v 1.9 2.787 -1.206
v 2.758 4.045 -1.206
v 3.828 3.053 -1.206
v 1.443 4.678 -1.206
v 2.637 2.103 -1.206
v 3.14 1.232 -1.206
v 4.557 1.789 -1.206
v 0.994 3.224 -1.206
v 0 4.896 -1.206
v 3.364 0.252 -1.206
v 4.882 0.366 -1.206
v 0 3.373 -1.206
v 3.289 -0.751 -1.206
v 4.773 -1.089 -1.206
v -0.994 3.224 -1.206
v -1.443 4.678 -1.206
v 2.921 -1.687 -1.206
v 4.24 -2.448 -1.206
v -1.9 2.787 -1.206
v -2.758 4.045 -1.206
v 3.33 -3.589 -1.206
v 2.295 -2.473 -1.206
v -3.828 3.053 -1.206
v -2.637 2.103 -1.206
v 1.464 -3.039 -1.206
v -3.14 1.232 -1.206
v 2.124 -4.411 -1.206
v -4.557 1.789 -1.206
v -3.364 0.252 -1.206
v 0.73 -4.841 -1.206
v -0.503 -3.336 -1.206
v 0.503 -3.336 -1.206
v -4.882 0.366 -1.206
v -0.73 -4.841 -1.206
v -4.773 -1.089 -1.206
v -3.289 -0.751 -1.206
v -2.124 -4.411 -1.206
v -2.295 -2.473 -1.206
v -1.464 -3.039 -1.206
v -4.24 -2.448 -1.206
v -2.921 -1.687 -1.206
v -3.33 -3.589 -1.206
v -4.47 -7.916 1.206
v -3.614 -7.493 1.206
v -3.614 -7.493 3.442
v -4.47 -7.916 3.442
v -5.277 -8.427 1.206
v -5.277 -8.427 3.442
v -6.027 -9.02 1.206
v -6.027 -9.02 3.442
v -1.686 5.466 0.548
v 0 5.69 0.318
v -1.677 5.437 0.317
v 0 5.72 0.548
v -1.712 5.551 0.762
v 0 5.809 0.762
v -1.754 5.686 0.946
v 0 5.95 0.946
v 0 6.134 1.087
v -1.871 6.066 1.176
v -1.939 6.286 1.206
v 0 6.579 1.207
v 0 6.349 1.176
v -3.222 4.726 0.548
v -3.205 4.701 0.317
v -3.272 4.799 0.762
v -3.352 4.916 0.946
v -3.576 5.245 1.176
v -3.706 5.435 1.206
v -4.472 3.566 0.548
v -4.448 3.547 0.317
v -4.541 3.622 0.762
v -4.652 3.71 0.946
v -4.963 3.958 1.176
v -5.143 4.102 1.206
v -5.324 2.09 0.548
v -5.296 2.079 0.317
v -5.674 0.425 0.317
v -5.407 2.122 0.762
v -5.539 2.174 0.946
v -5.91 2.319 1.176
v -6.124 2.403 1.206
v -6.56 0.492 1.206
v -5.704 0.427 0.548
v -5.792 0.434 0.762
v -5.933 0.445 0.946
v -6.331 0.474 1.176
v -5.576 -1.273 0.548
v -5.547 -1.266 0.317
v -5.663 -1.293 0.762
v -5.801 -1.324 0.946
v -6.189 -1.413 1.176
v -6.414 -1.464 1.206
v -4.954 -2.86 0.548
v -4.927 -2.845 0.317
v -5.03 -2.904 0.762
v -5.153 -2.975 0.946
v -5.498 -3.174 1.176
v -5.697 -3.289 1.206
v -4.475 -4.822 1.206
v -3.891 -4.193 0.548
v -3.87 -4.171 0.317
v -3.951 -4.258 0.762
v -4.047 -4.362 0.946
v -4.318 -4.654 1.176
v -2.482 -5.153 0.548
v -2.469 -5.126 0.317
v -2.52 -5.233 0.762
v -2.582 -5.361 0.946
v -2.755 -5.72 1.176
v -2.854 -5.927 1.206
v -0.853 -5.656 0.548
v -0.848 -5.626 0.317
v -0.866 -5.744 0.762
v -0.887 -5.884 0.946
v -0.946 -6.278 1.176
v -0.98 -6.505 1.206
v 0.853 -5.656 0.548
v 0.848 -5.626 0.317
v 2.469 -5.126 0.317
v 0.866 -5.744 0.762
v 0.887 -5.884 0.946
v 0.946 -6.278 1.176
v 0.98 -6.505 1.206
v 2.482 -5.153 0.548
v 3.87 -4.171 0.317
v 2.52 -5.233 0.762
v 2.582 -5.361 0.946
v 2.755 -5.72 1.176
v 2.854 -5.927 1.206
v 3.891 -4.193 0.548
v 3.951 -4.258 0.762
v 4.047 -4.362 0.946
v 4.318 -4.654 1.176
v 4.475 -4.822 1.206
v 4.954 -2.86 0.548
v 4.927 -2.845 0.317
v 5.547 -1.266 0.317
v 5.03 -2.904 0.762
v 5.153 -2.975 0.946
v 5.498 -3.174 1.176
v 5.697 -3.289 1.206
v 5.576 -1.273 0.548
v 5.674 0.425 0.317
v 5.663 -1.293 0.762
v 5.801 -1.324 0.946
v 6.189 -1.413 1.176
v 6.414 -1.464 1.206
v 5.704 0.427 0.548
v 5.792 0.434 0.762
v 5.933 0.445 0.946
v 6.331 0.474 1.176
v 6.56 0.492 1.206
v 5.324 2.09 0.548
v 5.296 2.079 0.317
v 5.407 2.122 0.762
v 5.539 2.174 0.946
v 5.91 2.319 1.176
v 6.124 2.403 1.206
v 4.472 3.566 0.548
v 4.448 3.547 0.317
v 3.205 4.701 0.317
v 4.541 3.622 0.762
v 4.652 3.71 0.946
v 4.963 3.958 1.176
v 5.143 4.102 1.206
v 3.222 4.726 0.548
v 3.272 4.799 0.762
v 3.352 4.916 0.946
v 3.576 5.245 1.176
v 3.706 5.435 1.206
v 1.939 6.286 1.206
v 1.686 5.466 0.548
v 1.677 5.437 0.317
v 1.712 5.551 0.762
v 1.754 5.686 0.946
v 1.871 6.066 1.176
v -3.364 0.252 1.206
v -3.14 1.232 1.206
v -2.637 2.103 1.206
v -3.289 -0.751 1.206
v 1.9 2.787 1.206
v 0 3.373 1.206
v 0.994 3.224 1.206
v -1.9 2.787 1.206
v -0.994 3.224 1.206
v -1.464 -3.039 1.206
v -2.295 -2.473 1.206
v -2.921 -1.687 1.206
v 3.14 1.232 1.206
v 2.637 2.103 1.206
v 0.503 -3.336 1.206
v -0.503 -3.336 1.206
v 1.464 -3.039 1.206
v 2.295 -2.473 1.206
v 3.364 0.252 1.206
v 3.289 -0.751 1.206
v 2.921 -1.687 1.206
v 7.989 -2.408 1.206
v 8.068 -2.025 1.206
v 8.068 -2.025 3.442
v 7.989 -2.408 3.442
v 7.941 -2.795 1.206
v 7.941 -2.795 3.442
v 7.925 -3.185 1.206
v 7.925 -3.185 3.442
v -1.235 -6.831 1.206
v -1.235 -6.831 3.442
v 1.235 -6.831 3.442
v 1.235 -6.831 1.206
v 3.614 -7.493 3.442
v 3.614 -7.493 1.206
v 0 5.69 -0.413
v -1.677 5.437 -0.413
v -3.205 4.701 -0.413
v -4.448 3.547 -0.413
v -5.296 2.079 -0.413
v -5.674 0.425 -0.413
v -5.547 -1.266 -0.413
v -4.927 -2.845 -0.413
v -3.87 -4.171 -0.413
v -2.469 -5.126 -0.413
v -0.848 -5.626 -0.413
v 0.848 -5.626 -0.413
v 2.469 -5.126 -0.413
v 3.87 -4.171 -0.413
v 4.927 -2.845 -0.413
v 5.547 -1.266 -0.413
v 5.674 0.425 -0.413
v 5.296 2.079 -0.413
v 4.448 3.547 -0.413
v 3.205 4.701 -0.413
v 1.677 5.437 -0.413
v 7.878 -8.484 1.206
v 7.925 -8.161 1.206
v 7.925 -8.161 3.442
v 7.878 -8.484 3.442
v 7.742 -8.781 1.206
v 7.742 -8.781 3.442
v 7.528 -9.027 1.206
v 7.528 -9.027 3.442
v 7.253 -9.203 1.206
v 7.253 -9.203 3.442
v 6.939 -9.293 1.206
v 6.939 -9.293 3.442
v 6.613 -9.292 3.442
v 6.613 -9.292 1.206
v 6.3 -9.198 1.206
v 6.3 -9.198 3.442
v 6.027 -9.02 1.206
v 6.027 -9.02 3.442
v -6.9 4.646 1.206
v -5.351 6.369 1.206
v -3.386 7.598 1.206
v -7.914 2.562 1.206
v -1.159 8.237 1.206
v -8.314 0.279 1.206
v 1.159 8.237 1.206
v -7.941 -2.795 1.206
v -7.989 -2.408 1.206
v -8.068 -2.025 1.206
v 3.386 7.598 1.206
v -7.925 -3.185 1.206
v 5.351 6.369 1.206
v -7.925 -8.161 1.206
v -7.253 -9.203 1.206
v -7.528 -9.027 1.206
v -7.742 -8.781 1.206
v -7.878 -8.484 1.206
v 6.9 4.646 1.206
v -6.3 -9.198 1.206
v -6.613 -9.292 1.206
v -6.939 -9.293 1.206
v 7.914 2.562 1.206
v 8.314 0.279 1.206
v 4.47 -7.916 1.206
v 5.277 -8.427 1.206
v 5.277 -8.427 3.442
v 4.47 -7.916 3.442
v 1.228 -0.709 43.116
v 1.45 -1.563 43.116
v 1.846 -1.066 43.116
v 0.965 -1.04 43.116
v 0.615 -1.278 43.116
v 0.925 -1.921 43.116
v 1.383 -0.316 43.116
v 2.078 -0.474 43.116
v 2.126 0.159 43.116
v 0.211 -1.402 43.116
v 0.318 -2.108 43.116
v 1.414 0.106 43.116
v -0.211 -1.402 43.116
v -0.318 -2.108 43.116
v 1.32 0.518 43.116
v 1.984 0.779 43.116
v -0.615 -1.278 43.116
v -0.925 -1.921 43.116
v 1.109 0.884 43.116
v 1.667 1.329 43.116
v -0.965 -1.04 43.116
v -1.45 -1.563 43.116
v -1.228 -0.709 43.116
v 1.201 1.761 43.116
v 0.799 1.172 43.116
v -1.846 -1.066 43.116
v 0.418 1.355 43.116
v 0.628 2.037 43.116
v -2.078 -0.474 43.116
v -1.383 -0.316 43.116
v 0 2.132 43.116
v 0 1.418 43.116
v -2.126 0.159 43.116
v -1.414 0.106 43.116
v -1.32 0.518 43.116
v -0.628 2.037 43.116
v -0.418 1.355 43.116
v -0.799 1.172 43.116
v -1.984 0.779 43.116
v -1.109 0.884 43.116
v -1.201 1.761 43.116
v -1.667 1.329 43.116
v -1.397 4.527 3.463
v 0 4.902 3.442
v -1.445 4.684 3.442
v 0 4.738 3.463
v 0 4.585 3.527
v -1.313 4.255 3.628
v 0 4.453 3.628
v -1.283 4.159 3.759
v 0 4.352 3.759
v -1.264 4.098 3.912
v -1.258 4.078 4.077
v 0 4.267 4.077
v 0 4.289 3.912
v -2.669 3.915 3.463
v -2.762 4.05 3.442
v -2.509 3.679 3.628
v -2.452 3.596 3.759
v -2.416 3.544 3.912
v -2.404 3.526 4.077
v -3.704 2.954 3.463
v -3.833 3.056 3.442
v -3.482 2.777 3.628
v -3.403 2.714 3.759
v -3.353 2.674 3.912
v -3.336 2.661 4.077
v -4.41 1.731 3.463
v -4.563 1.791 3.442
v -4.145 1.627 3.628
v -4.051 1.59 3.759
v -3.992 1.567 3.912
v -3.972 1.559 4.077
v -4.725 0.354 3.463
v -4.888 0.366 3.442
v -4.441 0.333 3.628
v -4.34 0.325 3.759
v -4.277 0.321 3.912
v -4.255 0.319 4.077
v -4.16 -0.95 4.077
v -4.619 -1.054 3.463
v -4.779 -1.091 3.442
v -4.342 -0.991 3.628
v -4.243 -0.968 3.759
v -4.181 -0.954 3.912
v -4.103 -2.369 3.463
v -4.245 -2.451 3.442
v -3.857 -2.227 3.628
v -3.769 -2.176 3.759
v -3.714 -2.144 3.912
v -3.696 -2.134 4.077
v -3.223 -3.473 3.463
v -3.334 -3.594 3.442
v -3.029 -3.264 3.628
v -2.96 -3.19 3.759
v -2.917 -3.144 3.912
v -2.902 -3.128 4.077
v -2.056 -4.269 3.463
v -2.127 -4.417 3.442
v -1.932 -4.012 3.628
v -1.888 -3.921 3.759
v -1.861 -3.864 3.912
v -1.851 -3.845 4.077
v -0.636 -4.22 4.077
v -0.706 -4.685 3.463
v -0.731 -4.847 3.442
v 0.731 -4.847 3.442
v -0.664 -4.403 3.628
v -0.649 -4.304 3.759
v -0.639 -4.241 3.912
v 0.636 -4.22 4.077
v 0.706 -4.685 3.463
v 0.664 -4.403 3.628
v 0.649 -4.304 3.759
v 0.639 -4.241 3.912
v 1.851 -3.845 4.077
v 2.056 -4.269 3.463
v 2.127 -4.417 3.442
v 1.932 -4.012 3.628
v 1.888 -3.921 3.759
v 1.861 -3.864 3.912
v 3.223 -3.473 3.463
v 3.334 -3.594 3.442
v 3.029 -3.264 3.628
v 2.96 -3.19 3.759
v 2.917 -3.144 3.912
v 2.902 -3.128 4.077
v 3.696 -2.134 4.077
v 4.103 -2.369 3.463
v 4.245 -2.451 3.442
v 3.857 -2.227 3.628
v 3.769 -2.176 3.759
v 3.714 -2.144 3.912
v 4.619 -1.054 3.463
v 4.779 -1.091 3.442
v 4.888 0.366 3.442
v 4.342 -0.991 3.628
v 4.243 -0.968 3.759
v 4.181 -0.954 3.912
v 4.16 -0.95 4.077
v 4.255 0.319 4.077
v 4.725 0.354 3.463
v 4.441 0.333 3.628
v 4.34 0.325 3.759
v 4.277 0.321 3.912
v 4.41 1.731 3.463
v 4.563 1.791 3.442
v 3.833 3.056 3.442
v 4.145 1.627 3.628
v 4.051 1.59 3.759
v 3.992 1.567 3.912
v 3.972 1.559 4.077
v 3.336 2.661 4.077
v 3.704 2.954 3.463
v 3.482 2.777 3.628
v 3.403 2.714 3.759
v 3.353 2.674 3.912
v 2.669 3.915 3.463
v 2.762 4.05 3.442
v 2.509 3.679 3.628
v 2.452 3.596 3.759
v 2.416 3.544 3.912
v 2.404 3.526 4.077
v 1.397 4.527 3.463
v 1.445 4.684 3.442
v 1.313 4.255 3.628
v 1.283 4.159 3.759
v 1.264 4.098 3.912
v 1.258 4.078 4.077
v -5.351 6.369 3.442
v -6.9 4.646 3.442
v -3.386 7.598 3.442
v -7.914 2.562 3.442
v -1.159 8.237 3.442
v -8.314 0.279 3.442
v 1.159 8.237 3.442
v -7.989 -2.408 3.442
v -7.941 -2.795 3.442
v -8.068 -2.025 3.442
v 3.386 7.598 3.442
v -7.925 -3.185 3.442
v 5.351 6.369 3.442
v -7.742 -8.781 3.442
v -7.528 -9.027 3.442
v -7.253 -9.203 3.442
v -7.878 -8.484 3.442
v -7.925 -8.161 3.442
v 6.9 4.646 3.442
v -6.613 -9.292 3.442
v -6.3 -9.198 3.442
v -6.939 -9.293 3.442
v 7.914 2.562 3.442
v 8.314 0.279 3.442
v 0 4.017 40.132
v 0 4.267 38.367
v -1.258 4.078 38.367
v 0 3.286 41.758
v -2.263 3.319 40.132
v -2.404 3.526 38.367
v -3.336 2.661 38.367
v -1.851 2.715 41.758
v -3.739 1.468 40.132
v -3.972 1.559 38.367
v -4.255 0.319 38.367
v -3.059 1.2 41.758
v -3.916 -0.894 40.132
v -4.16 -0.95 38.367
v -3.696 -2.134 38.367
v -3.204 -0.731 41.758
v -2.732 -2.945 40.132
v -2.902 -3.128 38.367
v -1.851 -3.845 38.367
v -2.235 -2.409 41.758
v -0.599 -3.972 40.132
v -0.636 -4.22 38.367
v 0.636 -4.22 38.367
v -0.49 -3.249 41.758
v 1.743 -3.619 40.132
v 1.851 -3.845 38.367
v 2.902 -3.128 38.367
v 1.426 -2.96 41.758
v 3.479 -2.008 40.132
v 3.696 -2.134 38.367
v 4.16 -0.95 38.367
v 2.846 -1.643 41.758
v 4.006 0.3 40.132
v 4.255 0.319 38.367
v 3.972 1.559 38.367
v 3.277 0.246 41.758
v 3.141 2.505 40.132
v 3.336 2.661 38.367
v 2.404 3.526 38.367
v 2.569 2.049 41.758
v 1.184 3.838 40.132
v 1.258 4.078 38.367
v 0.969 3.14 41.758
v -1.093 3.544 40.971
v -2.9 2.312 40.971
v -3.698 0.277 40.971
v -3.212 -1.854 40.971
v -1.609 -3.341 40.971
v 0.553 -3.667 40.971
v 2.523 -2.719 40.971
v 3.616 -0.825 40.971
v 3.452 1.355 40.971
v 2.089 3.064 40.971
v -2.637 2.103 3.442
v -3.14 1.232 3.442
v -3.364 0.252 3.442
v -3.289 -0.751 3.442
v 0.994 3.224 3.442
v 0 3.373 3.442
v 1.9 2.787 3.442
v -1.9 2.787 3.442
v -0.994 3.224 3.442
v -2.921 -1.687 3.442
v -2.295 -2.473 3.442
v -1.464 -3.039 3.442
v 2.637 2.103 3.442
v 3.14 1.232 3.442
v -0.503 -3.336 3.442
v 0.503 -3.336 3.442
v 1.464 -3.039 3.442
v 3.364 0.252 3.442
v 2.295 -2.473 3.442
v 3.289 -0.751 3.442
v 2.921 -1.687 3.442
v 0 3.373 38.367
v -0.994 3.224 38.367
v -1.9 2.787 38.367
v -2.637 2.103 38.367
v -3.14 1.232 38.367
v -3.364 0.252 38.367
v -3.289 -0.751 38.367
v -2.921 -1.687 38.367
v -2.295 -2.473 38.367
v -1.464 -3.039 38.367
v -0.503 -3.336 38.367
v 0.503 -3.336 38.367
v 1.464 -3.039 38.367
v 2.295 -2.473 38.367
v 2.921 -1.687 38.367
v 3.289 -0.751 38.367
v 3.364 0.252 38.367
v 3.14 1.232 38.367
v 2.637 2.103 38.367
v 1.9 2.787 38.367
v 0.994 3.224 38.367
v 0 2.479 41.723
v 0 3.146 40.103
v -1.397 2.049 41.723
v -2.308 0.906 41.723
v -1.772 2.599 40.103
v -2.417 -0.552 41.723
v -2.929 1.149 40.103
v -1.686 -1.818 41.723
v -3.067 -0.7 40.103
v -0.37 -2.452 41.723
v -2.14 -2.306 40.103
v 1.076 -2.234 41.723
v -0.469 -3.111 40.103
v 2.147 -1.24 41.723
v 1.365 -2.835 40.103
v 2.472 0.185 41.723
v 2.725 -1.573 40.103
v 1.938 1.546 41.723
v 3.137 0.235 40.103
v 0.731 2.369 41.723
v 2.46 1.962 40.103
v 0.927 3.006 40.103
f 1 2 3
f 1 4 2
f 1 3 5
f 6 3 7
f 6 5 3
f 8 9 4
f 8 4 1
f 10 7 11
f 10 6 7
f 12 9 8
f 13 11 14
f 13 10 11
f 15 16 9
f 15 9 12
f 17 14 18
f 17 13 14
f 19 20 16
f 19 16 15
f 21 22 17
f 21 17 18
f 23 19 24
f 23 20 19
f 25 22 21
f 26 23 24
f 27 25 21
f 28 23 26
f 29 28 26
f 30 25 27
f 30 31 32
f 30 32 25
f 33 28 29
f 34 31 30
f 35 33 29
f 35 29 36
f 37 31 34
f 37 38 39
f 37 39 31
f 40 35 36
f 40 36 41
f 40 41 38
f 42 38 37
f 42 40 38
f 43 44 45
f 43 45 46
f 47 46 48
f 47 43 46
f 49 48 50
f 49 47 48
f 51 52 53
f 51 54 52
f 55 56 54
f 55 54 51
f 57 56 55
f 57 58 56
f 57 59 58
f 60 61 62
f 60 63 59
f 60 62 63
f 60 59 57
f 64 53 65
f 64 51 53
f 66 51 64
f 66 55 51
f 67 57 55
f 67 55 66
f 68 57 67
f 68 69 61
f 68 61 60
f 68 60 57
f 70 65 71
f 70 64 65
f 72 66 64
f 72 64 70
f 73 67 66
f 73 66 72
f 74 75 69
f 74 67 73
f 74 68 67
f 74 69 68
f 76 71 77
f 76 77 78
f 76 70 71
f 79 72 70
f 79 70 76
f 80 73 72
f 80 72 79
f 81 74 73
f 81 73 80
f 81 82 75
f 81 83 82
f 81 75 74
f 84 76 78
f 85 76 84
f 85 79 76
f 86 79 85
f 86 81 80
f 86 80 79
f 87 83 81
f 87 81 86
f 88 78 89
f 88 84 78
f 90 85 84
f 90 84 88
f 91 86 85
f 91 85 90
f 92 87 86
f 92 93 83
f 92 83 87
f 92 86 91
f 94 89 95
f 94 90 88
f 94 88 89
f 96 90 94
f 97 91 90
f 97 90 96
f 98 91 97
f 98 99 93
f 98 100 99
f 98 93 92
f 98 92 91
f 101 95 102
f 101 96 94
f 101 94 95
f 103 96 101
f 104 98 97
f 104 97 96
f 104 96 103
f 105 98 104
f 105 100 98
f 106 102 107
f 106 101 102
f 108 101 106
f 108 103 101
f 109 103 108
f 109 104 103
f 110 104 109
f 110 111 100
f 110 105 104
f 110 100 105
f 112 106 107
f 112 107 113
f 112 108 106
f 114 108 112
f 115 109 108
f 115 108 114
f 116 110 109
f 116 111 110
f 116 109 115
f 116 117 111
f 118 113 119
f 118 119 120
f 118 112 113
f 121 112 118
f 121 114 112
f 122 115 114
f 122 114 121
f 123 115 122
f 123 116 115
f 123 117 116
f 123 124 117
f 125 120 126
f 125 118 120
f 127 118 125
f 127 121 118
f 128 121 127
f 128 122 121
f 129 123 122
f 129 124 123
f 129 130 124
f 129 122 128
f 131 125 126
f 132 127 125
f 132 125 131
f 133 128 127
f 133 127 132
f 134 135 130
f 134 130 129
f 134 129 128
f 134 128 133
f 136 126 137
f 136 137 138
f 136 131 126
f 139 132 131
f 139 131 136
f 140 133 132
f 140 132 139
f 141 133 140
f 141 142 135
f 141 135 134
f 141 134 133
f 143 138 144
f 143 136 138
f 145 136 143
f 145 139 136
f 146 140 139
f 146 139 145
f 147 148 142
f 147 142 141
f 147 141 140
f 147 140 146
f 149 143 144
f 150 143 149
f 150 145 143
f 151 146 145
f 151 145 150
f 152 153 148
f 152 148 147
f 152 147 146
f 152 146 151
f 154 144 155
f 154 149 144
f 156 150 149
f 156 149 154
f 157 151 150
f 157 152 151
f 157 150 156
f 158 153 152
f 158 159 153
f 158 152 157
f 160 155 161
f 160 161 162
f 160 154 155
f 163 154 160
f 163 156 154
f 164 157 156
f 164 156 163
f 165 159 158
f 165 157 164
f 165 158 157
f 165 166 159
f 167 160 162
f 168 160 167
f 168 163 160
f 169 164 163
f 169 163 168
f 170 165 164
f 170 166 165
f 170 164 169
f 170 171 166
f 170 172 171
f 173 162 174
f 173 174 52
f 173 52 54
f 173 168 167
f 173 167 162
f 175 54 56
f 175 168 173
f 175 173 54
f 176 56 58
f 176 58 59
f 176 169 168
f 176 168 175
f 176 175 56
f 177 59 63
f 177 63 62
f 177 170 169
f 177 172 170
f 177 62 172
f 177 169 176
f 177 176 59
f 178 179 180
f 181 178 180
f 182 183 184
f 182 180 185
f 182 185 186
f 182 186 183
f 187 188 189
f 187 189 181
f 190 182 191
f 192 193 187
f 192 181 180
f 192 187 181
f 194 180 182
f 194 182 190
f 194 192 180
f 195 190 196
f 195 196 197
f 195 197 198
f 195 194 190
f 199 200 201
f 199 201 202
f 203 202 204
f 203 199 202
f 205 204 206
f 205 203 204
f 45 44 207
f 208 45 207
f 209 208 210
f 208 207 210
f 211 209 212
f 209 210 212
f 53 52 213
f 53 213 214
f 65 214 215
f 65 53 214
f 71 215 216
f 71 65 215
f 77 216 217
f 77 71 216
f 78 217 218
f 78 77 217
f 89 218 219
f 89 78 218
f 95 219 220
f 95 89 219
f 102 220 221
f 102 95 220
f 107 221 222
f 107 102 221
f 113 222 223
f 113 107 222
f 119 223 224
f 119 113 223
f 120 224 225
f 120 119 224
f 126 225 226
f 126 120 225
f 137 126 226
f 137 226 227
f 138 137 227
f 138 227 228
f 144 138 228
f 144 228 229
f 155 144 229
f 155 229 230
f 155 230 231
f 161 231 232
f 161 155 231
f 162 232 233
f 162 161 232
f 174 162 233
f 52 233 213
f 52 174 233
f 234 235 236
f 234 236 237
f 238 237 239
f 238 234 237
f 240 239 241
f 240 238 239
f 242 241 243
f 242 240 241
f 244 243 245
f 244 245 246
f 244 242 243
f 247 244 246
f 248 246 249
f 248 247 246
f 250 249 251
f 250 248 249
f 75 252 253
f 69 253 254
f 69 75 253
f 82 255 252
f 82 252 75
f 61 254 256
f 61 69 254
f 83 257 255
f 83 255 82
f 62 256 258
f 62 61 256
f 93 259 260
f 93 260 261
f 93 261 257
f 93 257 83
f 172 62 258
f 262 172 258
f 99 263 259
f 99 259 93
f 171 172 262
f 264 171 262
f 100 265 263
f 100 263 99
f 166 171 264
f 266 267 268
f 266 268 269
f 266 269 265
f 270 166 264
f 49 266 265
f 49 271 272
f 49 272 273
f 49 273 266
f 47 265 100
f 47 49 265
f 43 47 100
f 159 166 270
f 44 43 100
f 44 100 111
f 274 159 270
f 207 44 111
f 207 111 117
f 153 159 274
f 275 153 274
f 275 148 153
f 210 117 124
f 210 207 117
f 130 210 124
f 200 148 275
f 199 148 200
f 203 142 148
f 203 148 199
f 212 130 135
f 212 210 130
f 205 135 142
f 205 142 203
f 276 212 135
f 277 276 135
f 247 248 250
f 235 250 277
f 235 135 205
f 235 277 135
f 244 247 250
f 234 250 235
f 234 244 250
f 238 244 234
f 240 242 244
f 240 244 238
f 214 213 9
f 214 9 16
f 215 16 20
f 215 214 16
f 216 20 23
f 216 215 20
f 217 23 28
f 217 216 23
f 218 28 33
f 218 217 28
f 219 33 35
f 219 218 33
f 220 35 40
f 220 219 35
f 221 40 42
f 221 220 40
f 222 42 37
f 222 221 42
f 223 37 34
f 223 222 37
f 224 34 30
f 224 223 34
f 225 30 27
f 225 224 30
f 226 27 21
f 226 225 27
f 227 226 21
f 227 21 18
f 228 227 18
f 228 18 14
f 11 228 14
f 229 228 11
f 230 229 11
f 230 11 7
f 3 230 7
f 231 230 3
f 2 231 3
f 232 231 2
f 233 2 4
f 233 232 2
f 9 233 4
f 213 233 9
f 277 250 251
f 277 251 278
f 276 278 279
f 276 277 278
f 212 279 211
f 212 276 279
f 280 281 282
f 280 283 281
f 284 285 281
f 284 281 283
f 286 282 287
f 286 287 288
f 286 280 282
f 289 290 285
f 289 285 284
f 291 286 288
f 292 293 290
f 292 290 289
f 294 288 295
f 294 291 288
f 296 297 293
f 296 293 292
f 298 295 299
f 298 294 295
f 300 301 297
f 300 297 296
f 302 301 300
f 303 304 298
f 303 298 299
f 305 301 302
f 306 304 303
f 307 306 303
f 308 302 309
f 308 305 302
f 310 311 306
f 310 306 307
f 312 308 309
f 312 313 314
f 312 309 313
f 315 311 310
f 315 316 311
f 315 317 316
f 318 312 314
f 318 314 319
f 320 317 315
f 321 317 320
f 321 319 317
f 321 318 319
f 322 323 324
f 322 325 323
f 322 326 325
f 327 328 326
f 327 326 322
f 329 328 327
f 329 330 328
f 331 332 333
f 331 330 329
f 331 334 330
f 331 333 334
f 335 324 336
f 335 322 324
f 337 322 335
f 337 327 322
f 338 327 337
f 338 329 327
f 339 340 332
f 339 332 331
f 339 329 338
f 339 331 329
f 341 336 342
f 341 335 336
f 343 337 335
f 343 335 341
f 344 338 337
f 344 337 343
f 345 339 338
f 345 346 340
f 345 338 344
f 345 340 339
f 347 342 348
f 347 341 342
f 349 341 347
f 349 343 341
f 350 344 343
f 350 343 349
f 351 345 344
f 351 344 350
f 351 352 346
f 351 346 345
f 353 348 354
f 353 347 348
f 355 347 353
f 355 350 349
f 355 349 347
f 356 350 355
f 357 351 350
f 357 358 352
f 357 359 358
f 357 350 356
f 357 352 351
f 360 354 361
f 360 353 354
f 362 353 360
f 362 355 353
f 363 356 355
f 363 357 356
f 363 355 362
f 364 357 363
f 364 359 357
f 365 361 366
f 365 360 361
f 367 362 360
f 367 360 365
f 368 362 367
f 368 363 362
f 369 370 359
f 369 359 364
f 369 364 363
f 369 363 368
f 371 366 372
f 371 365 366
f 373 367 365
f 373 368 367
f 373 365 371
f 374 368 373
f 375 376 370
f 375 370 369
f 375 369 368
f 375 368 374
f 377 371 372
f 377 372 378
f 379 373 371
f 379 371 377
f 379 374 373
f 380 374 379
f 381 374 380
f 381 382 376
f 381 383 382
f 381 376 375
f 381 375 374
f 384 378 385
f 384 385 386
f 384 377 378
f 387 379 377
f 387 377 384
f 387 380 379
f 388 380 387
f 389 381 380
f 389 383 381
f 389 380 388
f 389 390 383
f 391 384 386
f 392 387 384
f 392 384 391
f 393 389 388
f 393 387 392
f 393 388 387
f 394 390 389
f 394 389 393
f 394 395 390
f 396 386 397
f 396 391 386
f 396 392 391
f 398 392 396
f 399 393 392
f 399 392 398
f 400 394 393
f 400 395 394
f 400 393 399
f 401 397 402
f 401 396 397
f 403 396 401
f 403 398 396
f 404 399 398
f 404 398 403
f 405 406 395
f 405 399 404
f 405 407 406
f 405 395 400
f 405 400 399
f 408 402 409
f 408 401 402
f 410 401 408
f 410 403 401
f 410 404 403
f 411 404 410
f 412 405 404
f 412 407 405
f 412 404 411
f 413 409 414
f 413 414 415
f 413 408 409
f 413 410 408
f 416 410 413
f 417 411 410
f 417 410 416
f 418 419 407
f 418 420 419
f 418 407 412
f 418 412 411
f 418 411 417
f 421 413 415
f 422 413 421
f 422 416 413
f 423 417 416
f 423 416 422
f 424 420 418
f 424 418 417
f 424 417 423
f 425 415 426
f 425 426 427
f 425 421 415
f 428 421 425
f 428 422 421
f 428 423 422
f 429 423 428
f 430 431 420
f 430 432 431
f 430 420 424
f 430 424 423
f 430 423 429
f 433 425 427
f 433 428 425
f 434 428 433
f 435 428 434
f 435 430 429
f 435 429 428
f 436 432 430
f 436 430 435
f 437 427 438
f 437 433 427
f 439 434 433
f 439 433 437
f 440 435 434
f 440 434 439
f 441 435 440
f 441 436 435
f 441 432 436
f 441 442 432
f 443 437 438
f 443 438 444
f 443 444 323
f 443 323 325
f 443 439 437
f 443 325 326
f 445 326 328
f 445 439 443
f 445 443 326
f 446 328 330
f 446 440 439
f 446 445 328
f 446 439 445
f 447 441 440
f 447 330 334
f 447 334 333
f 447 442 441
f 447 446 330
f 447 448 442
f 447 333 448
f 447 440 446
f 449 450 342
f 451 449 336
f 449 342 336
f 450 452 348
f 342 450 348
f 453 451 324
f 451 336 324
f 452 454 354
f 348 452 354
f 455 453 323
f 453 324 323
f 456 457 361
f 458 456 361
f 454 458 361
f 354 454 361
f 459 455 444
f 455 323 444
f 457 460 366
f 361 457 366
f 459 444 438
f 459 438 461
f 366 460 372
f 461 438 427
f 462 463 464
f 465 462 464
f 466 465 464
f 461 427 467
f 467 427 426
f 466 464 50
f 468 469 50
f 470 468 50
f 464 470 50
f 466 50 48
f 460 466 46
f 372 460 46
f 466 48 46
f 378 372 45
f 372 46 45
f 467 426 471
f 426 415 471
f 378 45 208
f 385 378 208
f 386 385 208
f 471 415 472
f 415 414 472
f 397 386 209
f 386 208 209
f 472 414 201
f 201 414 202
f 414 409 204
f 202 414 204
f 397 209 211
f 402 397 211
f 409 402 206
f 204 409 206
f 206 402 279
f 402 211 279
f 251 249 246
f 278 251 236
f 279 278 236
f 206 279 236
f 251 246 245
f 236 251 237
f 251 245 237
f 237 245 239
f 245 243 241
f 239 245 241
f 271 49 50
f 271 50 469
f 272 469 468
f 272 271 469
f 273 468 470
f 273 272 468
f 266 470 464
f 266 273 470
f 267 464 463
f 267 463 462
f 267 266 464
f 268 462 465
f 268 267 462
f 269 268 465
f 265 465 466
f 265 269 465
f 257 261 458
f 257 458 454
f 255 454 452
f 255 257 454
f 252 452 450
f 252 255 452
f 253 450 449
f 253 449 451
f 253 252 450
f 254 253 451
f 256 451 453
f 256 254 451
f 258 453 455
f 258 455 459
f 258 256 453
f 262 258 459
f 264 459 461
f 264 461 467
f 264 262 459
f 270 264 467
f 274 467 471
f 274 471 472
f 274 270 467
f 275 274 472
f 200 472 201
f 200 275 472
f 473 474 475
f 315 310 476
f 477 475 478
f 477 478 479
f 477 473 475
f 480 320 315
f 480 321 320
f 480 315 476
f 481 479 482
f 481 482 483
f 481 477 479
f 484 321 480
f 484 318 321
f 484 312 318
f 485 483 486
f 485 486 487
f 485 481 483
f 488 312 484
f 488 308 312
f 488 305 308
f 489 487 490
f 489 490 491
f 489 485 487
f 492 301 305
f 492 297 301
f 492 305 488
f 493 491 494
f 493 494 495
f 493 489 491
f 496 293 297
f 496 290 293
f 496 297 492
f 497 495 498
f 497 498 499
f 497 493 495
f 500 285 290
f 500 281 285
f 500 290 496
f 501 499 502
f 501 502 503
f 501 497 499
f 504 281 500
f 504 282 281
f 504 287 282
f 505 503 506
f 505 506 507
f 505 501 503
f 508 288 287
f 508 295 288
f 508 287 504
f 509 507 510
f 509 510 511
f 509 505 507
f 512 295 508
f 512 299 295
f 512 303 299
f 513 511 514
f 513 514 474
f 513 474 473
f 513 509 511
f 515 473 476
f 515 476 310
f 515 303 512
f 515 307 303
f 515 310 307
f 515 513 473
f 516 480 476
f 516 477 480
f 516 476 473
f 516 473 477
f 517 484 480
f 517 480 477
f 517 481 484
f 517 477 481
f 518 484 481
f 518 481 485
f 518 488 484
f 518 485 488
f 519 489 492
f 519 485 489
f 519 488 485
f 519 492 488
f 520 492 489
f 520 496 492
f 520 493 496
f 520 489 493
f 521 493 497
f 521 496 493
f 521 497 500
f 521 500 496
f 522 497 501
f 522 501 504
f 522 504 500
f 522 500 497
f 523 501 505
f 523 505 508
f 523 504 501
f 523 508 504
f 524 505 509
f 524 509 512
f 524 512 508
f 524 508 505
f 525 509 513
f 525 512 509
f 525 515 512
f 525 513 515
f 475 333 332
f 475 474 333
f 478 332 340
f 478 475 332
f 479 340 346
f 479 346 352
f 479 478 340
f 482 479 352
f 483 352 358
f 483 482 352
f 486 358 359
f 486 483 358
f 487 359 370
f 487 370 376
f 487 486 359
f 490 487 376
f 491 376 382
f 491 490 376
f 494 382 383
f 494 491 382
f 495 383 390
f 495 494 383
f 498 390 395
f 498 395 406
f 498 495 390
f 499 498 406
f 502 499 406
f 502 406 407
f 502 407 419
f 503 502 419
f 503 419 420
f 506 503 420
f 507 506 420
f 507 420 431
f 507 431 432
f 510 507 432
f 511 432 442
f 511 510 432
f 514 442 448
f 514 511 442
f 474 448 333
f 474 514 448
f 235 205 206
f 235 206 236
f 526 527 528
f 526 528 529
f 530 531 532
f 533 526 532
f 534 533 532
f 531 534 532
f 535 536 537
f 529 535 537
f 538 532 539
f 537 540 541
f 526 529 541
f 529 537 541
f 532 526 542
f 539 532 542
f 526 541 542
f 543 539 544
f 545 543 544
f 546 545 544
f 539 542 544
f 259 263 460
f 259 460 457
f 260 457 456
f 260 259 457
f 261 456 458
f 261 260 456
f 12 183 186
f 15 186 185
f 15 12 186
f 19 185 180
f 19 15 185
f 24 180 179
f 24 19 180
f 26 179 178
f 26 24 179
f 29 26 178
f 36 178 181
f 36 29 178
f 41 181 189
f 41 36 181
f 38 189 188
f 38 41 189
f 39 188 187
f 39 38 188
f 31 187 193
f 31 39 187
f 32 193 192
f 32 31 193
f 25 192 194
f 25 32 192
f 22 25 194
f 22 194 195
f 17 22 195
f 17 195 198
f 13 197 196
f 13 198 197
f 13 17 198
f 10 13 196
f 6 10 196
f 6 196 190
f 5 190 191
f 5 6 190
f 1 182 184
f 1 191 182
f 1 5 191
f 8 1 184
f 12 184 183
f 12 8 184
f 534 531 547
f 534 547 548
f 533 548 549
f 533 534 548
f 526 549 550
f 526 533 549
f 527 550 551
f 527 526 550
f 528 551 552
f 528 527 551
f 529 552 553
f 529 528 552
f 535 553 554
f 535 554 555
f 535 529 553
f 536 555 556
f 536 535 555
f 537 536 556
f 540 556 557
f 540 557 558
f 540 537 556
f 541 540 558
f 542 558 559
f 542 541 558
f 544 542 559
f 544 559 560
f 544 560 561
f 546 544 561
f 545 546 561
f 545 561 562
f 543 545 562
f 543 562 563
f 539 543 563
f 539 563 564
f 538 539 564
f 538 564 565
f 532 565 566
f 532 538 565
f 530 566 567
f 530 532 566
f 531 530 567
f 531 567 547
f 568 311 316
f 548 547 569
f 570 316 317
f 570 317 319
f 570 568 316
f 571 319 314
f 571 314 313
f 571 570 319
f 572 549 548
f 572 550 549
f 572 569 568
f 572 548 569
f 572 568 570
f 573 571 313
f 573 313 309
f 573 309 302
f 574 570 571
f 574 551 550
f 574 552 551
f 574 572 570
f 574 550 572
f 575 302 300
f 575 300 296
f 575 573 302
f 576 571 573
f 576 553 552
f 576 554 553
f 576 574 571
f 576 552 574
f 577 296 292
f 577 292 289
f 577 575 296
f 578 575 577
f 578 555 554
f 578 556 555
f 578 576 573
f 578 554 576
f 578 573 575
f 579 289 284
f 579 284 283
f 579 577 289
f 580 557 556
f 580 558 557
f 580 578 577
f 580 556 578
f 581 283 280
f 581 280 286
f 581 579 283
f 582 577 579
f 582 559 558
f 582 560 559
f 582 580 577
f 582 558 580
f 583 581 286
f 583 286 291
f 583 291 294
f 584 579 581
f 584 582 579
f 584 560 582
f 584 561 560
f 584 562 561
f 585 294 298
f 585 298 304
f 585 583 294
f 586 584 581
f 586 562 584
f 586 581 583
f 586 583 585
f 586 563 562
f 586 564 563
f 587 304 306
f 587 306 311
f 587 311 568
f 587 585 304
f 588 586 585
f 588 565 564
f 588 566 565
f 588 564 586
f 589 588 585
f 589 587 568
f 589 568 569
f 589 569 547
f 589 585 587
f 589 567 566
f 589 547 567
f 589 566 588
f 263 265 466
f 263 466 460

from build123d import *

# Parameters (mm, degrees)
F2_SIZE2 = 0.79375
F2_SIZE  = 0.79375
F5_DEPTH = 2.2352
F6_DEPTH = 25.4


with BuildPart() as f1:
    # F0 (on Right) → F1 (revolve)
    with BuildSketch(Plane.YZ):
        with BuildLine():
            Line((3.3734375, 38.3667), (3.3734375, -1.2065))
            Line((3.3734375, -1.2065), (5.6896, -1.2065))
            Line((5.6896, -1.2065), (5.6896, 0.3175))
            ThreePointArc((5.6896, 0.3175), (5.9499820715, 0.9461179285), (6.5786, 1.2065))
            Line((6.5786, 1.2065), (7.651716578, 1.2065))
            ThreePointArc((7.651716578, 1.2065), (8.3185, 2.3241), (7.651716578, 3.4417))
            Line((7.651716578, 3.4417), (4.9022, 3.4417))
            ThreePointArc((4.9022, 3.4417), (4.4531871939, 3.6276871939), (4.2672, 4.0767))
            Line((4.2672, 4.0767), (4.2672, 38.3667))
            ThreePointArc((4.2672, 38.3667), (3.7087667963, 40.9705920952), (2.1316869154, 43.1165))
            Line((2.1316869154, 43.1165), (1.418192935, 43.1165))
            ThreePointArc((1.418192935, 43.1165), (2.8655068761, 40.9349475226), (3.3734375, 38.3667))
        make_face()
    revolve(axis=Axis((0, 0, 20.955), (0, 0, 1)))

    # F2
    f2_edges = [f1.edges().sort_by_distance(p)[0] for p in [
        (0, -5.6896, -1.2065),
    ]]
    chamfer(f2_edges, length=F2_SIZE, length2=F2_SIZE2)

    # F3 (on face) → F5 (join)
    with BuildSketch(Plane(origin=(0, 0, 1.2065), x_dir=(1, 0, 0), z_dir=(0, 0, -1))):
        with BuildLine():
            ThreePointArc((-7.9248, 3.1851184766), (-7.9607701824, 2.6008906675), (-8.0681373786, 2.0254879633))
            ThreePointArc((-8.0681373786, 2.0254879633), (0, -8.3185), (8.0681373786, 2.0254879633))
            ThreePointArc((8.0681373786, 2.0254879633), (7.9607701824, 2.6008906675), (7.9248, 3.1851184766))
            Line((7.9248, 3.1851184766), (7.9248, 8.1611684277))
            ThreePointArc((7.9248, 8.1611684277), (7.2528781234, 9.2025782422), (6.0271020093, 9.0195855424))
            ThreePointArc((6.0271020093, 9.0195855424), (4.8804481809, 8.1611234409), (3.6136161551, 7.4926110625))
            ThreePointArc((3.6136161551, 7.4926110625), (0, 6.746875), (-3.6136161551, 7.4926110625))
            ThreePointArc((-3.6136161551, 7.4926110625), (-4.8804481809, 8.1611234409), (-6.0271020093, 9.0195855424))
            ThreePointArc((-6.0271020093, 9.0195855424), (-7.2528781234, 9.2025782422), (-7.9248, 8.1611684277))
            Line((-7.9248, 8.1611684277), (-7.9248, 3.1851184766))
        make_face()
        with BuildLine():
            ThreePointArc((3.6136161551, 7.4926110625), (0, 8.3185), (-3.6136161551, 7.4926110625))
            ThreePointArc((-3.6136161551, 7.4926110625), (0, 6.746875), (3.6136161551, 7.4926110625))
        make_face()
    extrude(amount=-F5_DEPTH)

    # F4 (on face) → F6 (cut)
    with BuildSketch(Plane(origin=(0, 0, 1.2065), x_dir=(1, 0, 0), z_dir=(0, 0, -1))):
        with BuildLine():
            ThreePointArc((3.6136161551, 7.4926110625), (0, 8.3185), (-3.6136161551, 7.4926110625))
            ThreePointArc((-3.6136161551, 7.4926110625), (0, 6.746875), (3.6136161551, 7.4926110625))
        make_face()
    extrude(amount=-F6_DEPTH, mode=Mode.SUBTRACT)


solid = f1.part
